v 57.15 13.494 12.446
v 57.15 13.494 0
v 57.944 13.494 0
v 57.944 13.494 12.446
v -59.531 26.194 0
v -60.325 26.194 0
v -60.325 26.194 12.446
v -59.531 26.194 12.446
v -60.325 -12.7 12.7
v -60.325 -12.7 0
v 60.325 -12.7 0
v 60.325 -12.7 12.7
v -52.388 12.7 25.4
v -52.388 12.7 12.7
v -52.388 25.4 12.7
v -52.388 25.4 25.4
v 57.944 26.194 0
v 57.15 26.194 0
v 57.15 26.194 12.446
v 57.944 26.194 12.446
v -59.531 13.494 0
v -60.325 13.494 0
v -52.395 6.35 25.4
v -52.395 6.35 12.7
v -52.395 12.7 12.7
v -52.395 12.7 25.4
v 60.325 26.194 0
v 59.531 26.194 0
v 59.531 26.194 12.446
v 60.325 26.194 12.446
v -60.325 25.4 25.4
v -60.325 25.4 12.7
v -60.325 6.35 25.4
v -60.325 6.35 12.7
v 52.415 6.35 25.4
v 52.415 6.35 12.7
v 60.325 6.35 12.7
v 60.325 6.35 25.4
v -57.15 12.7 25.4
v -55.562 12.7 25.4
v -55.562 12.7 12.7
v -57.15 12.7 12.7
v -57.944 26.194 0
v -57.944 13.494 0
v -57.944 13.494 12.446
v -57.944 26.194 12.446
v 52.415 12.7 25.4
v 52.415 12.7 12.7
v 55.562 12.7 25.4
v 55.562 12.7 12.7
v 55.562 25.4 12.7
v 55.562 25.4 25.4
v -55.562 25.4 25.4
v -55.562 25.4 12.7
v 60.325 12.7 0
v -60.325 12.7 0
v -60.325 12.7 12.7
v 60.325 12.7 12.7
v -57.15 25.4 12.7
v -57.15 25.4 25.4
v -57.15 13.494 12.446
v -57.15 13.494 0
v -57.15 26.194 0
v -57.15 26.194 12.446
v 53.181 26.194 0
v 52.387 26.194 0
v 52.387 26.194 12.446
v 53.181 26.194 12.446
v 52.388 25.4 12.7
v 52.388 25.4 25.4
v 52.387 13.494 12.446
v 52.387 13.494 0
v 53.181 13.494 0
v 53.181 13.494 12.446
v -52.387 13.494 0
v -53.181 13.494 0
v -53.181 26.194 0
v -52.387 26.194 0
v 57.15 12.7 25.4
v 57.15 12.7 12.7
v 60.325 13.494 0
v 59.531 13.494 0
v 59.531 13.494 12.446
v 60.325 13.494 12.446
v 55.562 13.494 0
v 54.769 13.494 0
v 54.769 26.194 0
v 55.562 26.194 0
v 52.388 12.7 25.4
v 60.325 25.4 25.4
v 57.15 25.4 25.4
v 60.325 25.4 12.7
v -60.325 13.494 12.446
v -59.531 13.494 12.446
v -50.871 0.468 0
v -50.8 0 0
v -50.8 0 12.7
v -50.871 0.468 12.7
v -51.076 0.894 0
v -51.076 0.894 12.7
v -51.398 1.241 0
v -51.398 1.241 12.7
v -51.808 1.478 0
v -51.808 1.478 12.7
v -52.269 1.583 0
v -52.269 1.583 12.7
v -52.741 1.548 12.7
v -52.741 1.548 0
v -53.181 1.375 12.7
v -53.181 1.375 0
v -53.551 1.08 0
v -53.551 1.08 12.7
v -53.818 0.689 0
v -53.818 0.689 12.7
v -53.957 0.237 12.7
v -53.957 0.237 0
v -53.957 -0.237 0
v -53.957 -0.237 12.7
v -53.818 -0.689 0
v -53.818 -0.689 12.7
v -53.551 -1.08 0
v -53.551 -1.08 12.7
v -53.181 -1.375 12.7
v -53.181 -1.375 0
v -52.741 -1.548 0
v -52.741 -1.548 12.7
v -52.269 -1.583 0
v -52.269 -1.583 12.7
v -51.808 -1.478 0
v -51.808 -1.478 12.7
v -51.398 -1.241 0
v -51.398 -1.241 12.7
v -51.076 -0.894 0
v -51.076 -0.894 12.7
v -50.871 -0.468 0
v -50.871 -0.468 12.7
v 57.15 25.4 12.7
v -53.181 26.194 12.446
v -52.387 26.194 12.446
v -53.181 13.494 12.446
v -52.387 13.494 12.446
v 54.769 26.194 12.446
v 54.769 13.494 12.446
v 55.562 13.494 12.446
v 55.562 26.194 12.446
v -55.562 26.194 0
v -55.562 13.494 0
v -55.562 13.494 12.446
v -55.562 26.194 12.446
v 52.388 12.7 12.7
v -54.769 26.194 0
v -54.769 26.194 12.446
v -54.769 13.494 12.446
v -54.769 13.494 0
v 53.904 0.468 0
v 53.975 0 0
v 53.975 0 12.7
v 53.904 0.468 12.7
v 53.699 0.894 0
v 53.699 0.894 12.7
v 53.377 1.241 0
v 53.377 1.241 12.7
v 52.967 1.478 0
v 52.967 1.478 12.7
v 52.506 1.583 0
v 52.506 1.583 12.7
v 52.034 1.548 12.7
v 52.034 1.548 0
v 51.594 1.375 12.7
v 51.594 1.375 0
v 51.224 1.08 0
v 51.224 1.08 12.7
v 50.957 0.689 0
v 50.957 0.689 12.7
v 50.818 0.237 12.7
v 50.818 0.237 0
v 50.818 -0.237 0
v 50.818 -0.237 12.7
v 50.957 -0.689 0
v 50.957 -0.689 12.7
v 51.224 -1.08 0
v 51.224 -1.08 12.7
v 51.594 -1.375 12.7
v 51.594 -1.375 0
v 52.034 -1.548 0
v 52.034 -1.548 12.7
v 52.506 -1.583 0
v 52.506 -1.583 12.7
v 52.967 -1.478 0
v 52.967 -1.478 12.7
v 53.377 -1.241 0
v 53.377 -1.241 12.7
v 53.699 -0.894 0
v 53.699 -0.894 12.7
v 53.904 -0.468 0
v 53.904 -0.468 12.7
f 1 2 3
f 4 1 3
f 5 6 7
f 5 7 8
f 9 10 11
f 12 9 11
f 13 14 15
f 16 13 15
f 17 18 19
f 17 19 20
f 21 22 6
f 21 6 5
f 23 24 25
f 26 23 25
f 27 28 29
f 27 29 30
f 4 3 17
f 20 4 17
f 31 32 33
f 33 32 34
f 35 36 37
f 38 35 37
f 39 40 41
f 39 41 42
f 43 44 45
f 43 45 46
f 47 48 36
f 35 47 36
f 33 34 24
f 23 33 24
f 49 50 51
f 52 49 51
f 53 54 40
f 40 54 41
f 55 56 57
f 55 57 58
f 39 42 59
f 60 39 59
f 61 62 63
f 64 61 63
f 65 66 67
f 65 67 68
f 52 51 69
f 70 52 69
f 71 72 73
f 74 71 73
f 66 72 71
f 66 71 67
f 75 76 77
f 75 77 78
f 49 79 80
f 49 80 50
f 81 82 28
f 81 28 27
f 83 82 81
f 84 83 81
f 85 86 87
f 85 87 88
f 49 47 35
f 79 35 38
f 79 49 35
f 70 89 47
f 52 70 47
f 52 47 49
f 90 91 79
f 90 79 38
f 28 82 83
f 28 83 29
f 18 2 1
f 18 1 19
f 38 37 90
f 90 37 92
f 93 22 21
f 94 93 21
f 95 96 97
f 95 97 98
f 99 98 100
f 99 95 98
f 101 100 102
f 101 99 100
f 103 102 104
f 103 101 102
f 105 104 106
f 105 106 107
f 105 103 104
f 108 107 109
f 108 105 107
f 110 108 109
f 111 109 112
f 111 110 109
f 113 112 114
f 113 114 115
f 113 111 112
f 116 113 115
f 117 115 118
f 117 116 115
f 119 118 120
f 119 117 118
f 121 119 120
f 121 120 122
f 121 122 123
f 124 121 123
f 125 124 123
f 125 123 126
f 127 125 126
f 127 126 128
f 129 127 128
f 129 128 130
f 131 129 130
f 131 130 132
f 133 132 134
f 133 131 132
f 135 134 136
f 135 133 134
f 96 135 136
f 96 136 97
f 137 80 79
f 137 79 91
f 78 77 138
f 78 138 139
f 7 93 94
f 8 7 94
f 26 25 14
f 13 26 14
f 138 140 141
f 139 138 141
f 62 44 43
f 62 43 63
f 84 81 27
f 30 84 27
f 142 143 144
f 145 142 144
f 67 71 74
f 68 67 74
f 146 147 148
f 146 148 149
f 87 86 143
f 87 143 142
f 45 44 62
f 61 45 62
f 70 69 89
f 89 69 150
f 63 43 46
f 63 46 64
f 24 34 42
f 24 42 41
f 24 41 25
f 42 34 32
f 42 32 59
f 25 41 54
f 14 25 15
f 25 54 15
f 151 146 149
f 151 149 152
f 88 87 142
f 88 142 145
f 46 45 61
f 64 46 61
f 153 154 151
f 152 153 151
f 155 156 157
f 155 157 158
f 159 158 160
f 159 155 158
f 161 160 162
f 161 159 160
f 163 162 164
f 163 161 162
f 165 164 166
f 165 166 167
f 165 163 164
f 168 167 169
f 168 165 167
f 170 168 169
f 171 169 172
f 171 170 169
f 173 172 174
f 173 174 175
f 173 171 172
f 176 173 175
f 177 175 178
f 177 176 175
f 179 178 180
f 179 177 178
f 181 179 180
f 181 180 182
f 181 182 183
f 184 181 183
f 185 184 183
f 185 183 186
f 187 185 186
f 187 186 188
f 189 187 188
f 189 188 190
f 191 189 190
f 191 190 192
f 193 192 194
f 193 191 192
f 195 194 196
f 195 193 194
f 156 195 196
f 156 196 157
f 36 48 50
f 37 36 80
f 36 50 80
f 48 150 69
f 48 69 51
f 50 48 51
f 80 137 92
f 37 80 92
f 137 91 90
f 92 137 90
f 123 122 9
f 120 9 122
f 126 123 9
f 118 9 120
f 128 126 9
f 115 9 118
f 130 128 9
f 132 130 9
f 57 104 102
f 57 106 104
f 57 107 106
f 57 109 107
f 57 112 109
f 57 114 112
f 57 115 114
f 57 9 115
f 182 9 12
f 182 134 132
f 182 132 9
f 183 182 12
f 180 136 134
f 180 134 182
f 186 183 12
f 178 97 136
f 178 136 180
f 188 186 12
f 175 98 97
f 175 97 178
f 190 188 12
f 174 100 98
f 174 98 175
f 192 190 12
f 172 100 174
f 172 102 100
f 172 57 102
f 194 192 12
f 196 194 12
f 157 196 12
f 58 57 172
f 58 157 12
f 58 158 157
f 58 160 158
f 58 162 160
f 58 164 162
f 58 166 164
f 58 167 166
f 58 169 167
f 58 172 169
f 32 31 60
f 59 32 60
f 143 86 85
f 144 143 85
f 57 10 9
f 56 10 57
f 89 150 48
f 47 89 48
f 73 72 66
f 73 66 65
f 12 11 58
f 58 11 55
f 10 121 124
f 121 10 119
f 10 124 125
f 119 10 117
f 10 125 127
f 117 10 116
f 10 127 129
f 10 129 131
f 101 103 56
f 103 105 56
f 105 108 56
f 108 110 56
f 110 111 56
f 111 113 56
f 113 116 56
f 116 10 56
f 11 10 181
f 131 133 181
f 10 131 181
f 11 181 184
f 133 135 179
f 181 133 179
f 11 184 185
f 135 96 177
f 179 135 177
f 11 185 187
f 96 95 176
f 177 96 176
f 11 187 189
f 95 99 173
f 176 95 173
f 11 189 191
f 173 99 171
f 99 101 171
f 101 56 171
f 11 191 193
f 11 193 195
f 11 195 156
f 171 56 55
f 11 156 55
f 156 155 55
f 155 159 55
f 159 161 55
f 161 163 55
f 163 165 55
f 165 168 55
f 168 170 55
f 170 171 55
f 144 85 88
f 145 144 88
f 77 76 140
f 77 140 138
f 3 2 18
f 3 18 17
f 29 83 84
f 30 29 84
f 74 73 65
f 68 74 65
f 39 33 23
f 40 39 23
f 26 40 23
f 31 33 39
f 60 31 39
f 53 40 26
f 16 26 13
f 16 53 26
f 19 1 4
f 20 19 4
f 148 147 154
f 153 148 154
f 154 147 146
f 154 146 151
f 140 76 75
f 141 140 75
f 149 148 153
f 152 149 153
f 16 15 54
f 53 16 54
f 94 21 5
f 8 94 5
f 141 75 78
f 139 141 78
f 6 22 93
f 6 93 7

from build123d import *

# Parameters (mm, degrees)
F0_W     = 120.65
F0_H     = 25.4
F0_R     = 1.5875
F1_DEPTH = 12.7
F0_W_2   = 0.79375
F0_H_2   = 12.7
F2_DEPTH = 12.446
F3_W     = 3.175
F3_H     = 12.7
F4_DEPTH = 12.7


with BuildPart() as f1:
    # F0 (on Top) → F1 (new body)
    with BuildSketch(Plane.XY):
        Rectangle(F0_W, F0_H)
        with Locations((-52.3875, 0)):
            Circle(F0_R, mode=Mode.SUBTRACT)
        with Locations((52.3875, 0)):
            Circle(F0_R, mode=Mode.SUBTRACT)
    extrude(amount=F1_DEPTH)


with BuildPart() as f2:
    # F0 (on Top) → F2 (new body)
    with BuildSketch(Plane.XY):
        with Locations((-59.928125, 19.84375)):
            Rectangle(F0_W_2, F0_H_2)
        with Locations((-57.546875, 19.84375)):
            Rectangle(F0_W_2, F0_H_2)
        with Locations((-55.165625, 19.84375)):
            Rectangle(F0_W_2, F0_H_2)
        with Locations((-52.784375, 19.84375)):
            Rectangle(F0_W_2, F0_H_2)
        with Locations((52.784375, 19.84375)):
            Rectangle(F0_W_2, F0_H_2)
        with Locations((55.165625, 19.84375)):
            Rectangle(F0_W_2, F0_H_2)
        with Locations((57.546875, 19.84375)):
            Rectangle(F0_W_2, F0_H_2)
        with Locations((59.928125, 19.84375)):
            Rectangle(F0_W_2, F0_H_2)
    extrude(amount=F2_DEPTH)


with BuildPart() as f4:
    # F3 (on face) → F4 (new body)
    with BuildSketch(Plane.XY.offset(12.7)):
        with Locations((-58.7375, 19.05)):
            Rectangle(F3_W, F3_H)
        Polygon((-55.5625, 25.4), (-55.5625, 12.7), (-52.395087, 12.7), (-52.3875, 12.7), (-52.3875, 25.4), align=None)
        Polygon((52.3875, 25.4), (52.3875, 12.7), (52.414954, 12.7), (55.5625, 12.7), (55.5625, 25.4), align=None)
        with Locations((58.7375, 19.05)):
            Rectangle(F3_W, F3_H)
        Polygon((-57.15, 12.7), (-60.325, 12.7), (-60.325, 6.35), (-52.395087, 6.35), (-52.395087, 12.7), (-55.5625, 12.7), align=None)
        Polygon((52.414954, 6.35), (60.325, 6.35), (60.325, 12.7), (57.15, 12.7), (55.5625, 12.7), (52.414954, 12.7), align=None)
    extrude(amount=F4_DEPTH)


solid = Compound([f1.part, f2.part, f4.part])
